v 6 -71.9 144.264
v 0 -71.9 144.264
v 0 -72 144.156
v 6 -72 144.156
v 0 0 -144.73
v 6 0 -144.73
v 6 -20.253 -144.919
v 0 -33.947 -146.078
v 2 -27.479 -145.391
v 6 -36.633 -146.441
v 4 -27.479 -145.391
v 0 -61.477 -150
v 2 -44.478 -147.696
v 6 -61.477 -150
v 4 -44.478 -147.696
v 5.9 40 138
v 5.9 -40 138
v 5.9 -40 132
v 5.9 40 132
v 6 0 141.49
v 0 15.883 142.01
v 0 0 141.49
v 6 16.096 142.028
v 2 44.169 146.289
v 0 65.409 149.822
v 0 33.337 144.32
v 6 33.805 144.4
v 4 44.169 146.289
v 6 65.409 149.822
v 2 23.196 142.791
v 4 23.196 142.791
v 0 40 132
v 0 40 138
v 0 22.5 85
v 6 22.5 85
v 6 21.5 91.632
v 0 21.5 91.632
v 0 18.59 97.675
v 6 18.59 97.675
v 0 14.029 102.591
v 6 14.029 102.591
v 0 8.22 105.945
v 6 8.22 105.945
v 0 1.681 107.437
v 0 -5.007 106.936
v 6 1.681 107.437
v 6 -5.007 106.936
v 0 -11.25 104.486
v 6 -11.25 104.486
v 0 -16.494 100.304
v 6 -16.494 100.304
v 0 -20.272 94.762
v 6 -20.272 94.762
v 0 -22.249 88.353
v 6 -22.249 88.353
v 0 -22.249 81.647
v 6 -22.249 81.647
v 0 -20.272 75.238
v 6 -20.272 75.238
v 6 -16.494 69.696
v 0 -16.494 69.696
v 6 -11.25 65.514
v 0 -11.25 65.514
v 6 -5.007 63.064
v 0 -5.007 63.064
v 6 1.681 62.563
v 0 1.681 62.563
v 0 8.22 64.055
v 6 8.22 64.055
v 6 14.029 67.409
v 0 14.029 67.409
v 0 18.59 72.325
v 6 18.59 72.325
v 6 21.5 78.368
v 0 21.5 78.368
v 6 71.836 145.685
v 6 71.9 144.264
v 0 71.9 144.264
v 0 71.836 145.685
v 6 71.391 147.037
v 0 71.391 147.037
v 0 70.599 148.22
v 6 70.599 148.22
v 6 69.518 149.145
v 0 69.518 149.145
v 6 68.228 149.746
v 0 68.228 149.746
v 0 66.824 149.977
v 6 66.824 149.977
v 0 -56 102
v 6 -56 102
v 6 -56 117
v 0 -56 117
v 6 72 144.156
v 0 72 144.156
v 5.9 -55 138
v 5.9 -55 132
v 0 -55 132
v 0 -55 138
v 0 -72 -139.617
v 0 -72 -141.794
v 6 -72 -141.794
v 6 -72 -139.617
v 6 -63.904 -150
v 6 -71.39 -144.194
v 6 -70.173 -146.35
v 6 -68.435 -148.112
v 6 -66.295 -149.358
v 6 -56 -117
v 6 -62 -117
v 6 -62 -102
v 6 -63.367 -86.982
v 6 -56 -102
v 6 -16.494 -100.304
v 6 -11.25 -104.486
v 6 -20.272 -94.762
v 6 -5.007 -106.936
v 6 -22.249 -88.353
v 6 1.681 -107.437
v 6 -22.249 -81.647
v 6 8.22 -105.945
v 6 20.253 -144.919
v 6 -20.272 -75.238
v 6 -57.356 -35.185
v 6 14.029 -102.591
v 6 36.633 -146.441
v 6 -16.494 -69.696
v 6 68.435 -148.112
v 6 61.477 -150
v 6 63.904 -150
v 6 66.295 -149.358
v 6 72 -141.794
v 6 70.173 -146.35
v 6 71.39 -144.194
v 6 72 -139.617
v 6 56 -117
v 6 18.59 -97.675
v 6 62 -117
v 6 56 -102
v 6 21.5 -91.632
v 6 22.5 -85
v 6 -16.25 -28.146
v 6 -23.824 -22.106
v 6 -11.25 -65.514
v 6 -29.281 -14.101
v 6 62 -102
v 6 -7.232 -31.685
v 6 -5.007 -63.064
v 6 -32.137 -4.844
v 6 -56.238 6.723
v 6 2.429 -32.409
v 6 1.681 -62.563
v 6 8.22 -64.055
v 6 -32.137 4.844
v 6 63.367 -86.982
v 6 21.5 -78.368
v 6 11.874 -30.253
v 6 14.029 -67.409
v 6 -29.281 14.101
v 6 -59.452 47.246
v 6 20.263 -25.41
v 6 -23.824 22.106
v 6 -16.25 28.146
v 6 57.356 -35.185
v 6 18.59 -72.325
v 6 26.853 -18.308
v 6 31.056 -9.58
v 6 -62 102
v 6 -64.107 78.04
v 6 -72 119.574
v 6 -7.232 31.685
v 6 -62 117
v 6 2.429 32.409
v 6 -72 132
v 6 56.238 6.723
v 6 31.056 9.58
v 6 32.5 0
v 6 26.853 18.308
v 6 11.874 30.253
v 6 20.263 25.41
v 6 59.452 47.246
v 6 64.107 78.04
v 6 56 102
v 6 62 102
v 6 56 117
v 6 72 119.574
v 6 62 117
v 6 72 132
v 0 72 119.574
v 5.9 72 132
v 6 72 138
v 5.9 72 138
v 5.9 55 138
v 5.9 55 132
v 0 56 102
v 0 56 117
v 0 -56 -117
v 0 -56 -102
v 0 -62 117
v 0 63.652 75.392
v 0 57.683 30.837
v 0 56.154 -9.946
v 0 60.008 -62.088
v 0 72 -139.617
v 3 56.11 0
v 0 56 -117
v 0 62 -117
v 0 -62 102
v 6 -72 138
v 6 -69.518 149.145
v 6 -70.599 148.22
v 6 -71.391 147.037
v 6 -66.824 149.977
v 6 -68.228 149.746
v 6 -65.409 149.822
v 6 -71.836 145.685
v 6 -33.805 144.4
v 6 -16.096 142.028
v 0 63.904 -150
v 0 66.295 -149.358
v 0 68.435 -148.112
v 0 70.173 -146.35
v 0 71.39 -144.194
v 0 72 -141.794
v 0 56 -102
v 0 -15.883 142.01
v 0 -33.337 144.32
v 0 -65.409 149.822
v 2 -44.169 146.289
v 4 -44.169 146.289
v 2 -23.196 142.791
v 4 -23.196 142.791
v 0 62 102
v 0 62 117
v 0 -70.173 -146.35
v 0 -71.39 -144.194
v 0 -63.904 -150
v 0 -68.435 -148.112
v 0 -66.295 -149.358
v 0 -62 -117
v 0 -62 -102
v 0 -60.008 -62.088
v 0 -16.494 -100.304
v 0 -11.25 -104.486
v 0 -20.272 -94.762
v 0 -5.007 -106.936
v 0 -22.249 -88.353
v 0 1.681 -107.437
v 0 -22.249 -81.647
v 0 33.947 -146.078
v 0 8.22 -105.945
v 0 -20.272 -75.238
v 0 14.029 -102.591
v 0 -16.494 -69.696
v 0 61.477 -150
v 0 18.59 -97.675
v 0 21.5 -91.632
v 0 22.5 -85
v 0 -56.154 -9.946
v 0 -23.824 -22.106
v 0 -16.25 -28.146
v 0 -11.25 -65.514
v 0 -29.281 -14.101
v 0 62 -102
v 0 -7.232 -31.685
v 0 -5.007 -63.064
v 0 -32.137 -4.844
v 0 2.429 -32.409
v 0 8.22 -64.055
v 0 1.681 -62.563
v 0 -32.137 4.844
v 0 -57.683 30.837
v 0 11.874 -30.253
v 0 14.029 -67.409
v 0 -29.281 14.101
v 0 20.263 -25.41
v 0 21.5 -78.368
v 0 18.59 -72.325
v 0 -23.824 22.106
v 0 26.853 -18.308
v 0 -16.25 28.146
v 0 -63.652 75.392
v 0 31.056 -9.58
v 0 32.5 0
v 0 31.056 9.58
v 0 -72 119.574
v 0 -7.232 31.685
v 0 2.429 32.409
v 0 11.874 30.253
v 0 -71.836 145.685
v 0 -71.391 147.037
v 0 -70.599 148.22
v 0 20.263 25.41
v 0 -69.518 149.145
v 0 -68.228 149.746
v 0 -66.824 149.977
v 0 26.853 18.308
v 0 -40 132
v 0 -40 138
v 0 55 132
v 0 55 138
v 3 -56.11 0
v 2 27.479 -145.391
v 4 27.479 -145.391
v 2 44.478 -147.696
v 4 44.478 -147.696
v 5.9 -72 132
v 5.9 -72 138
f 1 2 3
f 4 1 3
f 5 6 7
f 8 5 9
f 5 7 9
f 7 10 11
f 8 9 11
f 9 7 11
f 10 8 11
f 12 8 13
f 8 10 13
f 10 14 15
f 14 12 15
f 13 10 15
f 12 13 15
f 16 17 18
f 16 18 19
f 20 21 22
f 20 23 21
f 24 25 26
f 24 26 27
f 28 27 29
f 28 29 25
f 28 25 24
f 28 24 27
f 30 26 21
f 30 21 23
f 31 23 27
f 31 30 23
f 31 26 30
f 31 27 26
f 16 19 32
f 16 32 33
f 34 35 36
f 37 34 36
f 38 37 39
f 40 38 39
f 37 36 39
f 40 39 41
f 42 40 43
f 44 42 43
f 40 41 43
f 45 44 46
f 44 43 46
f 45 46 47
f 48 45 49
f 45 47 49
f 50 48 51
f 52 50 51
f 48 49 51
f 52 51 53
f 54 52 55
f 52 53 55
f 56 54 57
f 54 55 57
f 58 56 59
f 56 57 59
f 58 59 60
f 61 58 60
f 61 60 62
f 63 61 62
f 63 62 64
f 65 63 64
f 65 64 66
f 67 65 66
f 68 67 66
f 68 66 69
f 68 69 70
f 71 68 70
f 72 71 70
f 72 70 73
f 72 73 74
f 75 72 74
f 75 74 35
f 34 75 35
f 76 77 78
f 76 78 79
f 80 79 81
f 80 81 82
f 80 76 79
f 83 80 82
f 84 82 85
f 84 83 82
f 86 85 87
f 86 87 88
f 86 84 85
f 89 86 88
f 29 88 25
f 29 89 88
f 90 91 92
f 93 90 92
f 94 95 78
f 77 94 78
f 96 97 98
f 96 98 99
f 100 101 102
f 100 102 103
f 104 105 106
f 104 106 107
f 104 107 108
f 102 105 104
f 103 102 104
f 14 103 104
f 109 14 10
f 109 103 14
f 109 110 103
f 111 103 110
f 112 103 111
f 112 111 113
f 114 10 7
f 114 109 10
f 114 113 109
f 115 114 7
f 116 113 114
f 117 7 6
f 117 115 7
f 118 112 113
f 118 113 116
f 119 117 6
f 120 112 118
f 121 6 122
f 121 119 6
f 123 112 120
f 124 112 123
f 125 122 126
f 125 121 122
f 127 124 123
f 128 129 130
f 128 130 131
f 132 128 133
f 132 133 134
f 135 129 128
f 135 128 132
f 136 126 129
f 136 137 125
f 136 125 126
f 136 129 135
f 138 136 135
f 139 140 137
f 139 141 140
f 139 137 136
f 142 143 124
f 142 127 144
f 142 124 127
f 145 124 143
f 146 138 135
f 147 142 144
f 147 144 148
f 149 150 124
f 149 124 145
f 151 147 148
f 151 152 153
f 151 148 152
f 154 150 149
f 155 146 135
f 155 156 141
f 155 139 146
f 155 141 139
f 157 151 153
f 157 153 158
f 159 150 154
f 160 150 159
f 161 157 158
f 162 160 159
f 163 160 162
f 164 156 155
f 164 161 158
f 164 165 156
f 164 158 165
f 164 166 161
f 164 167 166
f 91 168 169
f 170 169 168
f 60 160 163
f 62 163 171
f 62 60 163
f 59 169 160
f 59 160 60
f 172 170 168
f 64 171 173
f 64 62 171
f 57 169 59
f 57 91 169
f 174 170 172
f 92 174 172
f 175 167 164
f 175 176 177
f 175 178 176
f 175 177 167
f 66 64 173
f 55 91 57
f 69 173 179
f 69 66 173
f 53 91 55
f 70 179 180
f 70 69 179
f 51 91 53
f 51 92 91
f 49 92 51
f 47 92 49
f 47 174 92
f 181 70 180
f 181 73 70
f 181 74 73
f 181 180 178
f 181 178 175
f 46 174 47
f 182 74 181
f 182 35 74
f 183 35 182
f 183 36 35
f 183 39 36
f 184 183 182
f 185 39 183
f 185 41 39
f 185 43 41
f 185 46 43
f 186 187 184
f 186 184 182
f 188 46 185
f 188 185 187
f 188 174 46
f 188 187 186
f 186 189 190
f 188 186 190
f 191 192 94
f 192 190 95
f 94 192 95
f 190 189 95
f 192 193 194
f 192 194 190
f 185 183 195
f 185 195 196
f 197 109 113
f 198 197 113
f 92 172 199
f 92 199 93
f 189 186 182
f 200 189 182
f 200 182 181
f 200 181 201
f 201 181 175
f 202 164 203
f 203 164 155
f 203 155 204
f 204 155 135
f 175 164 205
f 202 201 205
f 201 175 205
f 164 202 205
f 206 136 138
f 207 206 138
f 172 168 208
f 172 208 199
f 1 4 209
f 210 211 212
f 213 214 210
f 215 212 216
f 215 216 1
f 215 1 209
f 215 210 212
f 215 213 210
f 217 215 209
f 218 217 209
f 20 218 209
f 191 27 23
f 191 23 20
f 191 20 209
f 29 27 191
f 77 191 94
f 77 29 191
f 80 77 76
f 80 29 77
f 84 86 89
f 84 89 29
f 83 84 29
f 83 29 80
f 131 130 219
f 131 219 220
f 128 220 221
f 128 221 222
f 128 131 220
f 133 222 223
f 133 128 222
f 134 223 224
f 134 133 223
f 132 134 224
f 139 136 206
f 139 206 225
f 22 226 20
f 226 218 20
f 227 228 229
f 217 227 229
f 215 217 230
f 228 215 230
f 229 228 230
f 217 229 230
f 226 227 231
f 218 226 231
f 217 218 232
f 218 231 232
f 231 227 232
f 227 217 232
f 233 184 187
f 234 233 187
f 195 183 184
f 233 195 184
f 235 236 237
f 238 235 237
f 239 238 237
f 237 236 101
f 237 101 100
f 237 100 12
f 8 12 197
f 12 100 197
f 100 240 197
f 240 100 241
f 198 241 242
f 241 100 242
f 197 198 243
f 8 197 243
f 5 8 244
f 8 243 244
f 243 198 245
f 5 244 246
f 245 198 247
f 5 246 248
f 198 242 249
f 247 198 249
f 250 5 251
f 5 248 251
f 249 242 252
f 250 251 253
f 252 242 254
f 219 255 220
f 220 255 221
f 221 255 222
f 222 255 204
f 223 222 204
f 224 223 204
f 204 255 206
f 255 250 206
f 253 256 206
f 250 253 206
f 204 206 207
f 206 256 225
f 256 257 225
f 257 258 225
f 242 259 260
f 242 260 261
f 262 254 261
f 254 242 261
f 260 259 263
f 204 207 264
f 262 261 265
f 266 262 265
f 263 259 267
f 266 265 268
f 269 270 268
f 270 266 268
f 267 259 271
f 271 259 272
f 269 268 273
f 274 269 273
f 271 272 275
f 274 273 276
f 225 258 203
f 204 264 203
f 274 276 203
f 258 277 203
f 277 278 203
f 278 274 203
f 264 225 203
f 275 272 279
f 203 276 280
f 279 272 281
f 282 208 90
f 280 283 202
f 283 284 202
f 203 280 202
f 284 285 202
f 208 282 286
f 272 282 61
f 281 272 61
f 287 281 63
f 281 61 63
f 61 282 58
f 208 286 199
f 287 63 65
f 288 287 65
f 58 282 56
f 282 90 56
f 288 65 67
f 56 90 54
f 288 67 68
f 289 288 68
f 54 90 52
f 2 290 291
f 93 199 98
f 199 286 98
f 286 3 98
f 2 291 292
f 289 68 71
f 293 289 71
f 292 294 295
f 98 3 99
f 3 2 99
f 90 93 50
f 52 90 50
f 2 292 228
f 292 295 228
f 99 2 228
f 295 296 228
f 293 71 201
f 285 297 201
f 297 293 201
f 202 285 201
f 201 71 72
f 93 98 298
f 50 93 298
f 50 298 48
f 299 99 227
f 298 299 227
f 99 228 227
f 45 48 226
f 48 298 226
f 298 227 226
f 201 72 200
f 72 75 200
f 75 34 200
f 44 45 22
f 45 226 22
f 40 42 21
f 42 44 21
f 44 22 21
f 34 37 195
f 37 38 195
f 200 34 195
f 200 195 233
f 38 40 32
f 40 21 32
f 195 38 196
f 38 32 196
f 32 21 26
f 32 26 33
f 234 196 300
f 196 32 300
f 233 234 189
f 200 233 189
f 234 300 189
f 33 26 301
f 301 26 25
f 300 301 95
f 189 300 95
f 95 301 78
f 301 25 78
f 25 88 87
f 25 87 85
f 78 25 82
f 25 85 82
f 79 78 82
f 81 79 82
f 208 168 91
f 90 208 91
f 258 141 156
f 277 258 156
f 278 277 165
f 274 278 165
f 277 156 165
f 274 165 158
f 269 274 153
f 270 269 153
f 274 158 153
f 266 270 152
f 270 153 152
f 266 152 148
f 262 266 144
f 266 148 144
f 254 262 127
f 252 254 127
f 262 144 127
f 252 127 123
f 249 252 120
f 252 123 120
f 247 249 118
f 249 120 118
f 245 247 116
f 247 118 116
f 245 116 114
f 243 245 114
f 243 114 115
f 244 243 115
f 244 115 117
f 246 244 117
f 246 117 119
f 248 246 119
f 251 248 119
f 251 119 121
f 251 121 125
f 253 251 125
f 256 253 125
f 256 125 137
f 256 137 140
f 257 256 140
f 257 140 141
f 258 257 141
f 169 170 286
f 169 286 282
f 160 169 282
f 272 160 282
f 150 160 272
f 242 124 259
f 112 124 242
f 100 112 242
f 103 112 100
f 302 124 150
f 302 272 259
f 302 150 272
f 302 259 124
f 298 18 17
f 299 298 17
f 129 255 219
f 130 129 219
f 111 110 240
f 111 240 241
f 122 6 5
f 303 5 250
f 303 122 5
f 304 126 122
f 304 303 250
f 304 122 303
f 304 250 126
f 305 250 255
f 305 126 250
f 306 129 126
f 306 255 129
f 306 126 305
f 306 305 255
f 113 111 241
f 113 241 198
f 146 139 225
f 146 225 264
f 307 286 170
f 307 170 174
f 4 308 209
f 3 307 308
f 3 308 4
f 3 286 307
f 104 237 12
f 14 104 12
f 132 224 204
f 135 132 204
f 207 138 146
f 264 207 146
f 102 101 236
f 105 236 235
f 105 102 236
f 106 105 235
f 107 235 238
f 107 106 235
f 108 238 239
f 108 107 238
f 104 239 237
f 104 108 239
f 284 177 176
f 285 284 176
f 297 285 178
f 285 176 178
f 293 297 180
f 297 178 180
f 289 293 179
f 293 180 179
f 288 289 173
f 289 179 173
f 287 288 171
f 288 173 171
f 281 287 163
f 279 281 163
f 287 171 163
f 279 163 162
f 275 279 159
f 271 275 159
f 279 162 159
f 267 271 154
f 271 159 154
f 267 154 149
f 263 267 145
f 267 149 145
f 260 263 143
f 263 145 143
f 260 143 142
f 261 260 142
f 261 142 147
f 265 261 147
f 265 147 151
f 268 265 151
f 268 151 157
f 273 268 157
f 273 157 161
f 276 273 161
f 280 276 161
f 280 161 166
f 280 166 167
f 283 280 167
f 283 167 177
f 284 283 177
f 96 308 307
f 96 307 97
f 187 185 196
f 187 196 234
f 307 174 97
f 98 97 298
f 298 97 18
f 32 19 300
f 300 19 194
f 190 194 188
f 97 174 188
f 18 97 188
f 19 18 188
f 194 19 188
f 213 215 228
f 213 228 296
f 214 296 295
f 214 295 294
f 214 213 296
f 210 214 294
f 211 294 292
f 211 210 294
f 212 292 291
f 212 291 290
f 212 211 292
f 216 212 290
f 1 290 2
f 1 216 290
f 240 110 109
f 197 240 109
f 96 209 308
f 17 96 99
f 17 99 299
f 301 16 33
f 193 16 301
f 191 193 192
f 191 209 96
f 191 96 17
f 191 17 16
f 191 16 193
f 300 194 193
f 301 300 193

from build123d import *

# Parameters (mm, degrees)
F0_W     = 144
F0_H     = 300
F1_DEPTH = 6
F3_DEPTH = 0.1
F4_R     = 22.5
F4_R_2   = 32.5
F5_DEPTH = 25
F6_W     = 15
F6_H     = 6
F7_DEPTH = 25
F8_W     = 6
F8_H     = 15
F9_DEPTH = 25


with BuildPart() as f1:
    # F0 (on Right) → F1 (new body)
    with BuildSketch(Plane.YZ):
        Rectangle(F0_W, F0_H)
    extrude(amount=F1_DEPTH)

    # F2 (on face) → F3 (cut)
    with BuildSketch(Plane.YZ.offset(6)):
        Polygon((-75, 132), (75, 132), (75, 138), (0, 138), (-75, 138), align=None)
    extrude(amount=-F3_DEPTH, mode=Mode.SUBTRACT)

    # F4 (on face) → F5 (intersect)
    with BuildSketch(Plane.YZ.offset(6)):
        with BuildLine():
            add(Edge.make_bspline(
                [(-72, 119.5738017559), (-64.2497774345, 80.5000488248), (-48.1346297131, -0.7465599275), (-63.8451208348, -92.1644998818), (-72, -139.617010951)],
                knots=[0, 0, 0, 0, 0.4809278016, 1, 1, 1, 1], degree=3))
            ThreePointArc((-72, -139.617010951), (-69.2733831197, -147.3778685956), (-61.4766031504, -150))
            add(Edge.make_bspline(
                [(0, -144.7299867868), (-36.2115949392, -144.0225094557), (-40.9844021002, -148.2433289289), (-61.4766031504, -150)],
                knots=[0, 0, 0, 0, 61.7020726895, 61.7020726895, 61.7020726895, 61.7020726895], degree=3))
            add(Edge.make_bspline(
                [(0, -144.7299867868), (36.2115949392, -144.0225094557), (40.9844021002, -148.2433289289), (61.4766031504, -150)],
                knots=[0, 0, 0, 0, 61.7020726895, 61.7020726895, 61.7020726895, 61.7020726895], degree=3))
            ThreePointArc((61.4766031504, -150), (69.2733831197, -147.3778685956), (72, -139.617010951))
            add(Edge.make_bspline(
                [(72, 119.5738017559), (64.2497774345, 80.5000488248), (48.1346297131, -0.7465599275), (63.8451208348, -92.1644998818), (72, -139.617010951)],
                knots=[0, 0, 0, 0, 0.4809278016, 1, 1, 1, 1], degree=3))
            Line((72, 119.5738017559), (83.392560482, 131.8830251694))
            Line((83.392560482, 131.8830251694), (71.9000700982, 144.2635640774))
            ThreePointArc((71.9000700982, 144.2635640774), (70.0901190751, 148.7192160834), (65.4091020209, 149.8223193611))
            add(Edge.make_bspline(
                [(65.4091020209, 149.8223193611), (43.2062713991, 146.9935488104), (25.1373257488, 140.970274806), (0, 141.4896994829)],
                knots=[0, 0, 0, 0, 65.9377219898, 65.9377219898, 65.9377219898, 65.9377219898], degree=3))
            add(Edge.make_bspline(
                [(-65.4091020209, 149.8223193611), (-43.2062713991, 146.9935488104), (-25.1373257488, 140.970274806), (0, 141.4896994829)],
                knots=[0, 0, 0, 0, 65.9377219898, 65.9377219898, 65.9377219898, 65.9377219898], degree=3))
            ThreePointArc((-65.4091020209, 149.8223193611), (-70.0901190751, 148.7192160834), (-71.9000700982, 144.2635640774))
            Line((-71.9000700982, 144.2635640774), (-83.392560482, 131.8830251694))
            Line((-83.392560482, 131.8830251694), (-72, 119.5738017559))
        make_face()
        with Locations((0, -85)):
            Circle(F4_R, mode=Mode.SUBTRACT)
        Circle(F4_R_2, mode=Mode.SUBTRACT)
        with Locations((0, 85)):
            Circle(F4_R, mode=Mode.SUBTRACT)
    extrude(amount=-F5_DEPTH, mode=Mode.INTERSECT)

    # F6 (on face) → F7 (cut)
    with BuildSketch(Plane.YZ.offset(5.9)):
        with Locations((-47.5, 135)):
            Rectangle(F6_W, F6_H)
        with Locations((47.5, 135)):
            Rectangle(F6_W, F6_H)
    extrude(amount=-F7_DEPTH, mode=Mode.SUBTRACT)

    # F8 (on face) → F9 (cut)
    with BuildSketch(Plane.YZ.offset(6)):
        with Locations((59, 109.5)):
            Rectangle(F8_W, F8_H)
        with Locations((59, -109.5)):
            Rectangle(F8_W, F8_H)
        with Locations((-59, 109.5)):
            Rectangle(F8_W, F8_H)
        with Locations((-59, -109.5)):
            Rectangle(F8_W, F8_H)
    extrude(amount=-F9_DEPTH, mode=Mode.SUBTRACT)


solid = f1.part
